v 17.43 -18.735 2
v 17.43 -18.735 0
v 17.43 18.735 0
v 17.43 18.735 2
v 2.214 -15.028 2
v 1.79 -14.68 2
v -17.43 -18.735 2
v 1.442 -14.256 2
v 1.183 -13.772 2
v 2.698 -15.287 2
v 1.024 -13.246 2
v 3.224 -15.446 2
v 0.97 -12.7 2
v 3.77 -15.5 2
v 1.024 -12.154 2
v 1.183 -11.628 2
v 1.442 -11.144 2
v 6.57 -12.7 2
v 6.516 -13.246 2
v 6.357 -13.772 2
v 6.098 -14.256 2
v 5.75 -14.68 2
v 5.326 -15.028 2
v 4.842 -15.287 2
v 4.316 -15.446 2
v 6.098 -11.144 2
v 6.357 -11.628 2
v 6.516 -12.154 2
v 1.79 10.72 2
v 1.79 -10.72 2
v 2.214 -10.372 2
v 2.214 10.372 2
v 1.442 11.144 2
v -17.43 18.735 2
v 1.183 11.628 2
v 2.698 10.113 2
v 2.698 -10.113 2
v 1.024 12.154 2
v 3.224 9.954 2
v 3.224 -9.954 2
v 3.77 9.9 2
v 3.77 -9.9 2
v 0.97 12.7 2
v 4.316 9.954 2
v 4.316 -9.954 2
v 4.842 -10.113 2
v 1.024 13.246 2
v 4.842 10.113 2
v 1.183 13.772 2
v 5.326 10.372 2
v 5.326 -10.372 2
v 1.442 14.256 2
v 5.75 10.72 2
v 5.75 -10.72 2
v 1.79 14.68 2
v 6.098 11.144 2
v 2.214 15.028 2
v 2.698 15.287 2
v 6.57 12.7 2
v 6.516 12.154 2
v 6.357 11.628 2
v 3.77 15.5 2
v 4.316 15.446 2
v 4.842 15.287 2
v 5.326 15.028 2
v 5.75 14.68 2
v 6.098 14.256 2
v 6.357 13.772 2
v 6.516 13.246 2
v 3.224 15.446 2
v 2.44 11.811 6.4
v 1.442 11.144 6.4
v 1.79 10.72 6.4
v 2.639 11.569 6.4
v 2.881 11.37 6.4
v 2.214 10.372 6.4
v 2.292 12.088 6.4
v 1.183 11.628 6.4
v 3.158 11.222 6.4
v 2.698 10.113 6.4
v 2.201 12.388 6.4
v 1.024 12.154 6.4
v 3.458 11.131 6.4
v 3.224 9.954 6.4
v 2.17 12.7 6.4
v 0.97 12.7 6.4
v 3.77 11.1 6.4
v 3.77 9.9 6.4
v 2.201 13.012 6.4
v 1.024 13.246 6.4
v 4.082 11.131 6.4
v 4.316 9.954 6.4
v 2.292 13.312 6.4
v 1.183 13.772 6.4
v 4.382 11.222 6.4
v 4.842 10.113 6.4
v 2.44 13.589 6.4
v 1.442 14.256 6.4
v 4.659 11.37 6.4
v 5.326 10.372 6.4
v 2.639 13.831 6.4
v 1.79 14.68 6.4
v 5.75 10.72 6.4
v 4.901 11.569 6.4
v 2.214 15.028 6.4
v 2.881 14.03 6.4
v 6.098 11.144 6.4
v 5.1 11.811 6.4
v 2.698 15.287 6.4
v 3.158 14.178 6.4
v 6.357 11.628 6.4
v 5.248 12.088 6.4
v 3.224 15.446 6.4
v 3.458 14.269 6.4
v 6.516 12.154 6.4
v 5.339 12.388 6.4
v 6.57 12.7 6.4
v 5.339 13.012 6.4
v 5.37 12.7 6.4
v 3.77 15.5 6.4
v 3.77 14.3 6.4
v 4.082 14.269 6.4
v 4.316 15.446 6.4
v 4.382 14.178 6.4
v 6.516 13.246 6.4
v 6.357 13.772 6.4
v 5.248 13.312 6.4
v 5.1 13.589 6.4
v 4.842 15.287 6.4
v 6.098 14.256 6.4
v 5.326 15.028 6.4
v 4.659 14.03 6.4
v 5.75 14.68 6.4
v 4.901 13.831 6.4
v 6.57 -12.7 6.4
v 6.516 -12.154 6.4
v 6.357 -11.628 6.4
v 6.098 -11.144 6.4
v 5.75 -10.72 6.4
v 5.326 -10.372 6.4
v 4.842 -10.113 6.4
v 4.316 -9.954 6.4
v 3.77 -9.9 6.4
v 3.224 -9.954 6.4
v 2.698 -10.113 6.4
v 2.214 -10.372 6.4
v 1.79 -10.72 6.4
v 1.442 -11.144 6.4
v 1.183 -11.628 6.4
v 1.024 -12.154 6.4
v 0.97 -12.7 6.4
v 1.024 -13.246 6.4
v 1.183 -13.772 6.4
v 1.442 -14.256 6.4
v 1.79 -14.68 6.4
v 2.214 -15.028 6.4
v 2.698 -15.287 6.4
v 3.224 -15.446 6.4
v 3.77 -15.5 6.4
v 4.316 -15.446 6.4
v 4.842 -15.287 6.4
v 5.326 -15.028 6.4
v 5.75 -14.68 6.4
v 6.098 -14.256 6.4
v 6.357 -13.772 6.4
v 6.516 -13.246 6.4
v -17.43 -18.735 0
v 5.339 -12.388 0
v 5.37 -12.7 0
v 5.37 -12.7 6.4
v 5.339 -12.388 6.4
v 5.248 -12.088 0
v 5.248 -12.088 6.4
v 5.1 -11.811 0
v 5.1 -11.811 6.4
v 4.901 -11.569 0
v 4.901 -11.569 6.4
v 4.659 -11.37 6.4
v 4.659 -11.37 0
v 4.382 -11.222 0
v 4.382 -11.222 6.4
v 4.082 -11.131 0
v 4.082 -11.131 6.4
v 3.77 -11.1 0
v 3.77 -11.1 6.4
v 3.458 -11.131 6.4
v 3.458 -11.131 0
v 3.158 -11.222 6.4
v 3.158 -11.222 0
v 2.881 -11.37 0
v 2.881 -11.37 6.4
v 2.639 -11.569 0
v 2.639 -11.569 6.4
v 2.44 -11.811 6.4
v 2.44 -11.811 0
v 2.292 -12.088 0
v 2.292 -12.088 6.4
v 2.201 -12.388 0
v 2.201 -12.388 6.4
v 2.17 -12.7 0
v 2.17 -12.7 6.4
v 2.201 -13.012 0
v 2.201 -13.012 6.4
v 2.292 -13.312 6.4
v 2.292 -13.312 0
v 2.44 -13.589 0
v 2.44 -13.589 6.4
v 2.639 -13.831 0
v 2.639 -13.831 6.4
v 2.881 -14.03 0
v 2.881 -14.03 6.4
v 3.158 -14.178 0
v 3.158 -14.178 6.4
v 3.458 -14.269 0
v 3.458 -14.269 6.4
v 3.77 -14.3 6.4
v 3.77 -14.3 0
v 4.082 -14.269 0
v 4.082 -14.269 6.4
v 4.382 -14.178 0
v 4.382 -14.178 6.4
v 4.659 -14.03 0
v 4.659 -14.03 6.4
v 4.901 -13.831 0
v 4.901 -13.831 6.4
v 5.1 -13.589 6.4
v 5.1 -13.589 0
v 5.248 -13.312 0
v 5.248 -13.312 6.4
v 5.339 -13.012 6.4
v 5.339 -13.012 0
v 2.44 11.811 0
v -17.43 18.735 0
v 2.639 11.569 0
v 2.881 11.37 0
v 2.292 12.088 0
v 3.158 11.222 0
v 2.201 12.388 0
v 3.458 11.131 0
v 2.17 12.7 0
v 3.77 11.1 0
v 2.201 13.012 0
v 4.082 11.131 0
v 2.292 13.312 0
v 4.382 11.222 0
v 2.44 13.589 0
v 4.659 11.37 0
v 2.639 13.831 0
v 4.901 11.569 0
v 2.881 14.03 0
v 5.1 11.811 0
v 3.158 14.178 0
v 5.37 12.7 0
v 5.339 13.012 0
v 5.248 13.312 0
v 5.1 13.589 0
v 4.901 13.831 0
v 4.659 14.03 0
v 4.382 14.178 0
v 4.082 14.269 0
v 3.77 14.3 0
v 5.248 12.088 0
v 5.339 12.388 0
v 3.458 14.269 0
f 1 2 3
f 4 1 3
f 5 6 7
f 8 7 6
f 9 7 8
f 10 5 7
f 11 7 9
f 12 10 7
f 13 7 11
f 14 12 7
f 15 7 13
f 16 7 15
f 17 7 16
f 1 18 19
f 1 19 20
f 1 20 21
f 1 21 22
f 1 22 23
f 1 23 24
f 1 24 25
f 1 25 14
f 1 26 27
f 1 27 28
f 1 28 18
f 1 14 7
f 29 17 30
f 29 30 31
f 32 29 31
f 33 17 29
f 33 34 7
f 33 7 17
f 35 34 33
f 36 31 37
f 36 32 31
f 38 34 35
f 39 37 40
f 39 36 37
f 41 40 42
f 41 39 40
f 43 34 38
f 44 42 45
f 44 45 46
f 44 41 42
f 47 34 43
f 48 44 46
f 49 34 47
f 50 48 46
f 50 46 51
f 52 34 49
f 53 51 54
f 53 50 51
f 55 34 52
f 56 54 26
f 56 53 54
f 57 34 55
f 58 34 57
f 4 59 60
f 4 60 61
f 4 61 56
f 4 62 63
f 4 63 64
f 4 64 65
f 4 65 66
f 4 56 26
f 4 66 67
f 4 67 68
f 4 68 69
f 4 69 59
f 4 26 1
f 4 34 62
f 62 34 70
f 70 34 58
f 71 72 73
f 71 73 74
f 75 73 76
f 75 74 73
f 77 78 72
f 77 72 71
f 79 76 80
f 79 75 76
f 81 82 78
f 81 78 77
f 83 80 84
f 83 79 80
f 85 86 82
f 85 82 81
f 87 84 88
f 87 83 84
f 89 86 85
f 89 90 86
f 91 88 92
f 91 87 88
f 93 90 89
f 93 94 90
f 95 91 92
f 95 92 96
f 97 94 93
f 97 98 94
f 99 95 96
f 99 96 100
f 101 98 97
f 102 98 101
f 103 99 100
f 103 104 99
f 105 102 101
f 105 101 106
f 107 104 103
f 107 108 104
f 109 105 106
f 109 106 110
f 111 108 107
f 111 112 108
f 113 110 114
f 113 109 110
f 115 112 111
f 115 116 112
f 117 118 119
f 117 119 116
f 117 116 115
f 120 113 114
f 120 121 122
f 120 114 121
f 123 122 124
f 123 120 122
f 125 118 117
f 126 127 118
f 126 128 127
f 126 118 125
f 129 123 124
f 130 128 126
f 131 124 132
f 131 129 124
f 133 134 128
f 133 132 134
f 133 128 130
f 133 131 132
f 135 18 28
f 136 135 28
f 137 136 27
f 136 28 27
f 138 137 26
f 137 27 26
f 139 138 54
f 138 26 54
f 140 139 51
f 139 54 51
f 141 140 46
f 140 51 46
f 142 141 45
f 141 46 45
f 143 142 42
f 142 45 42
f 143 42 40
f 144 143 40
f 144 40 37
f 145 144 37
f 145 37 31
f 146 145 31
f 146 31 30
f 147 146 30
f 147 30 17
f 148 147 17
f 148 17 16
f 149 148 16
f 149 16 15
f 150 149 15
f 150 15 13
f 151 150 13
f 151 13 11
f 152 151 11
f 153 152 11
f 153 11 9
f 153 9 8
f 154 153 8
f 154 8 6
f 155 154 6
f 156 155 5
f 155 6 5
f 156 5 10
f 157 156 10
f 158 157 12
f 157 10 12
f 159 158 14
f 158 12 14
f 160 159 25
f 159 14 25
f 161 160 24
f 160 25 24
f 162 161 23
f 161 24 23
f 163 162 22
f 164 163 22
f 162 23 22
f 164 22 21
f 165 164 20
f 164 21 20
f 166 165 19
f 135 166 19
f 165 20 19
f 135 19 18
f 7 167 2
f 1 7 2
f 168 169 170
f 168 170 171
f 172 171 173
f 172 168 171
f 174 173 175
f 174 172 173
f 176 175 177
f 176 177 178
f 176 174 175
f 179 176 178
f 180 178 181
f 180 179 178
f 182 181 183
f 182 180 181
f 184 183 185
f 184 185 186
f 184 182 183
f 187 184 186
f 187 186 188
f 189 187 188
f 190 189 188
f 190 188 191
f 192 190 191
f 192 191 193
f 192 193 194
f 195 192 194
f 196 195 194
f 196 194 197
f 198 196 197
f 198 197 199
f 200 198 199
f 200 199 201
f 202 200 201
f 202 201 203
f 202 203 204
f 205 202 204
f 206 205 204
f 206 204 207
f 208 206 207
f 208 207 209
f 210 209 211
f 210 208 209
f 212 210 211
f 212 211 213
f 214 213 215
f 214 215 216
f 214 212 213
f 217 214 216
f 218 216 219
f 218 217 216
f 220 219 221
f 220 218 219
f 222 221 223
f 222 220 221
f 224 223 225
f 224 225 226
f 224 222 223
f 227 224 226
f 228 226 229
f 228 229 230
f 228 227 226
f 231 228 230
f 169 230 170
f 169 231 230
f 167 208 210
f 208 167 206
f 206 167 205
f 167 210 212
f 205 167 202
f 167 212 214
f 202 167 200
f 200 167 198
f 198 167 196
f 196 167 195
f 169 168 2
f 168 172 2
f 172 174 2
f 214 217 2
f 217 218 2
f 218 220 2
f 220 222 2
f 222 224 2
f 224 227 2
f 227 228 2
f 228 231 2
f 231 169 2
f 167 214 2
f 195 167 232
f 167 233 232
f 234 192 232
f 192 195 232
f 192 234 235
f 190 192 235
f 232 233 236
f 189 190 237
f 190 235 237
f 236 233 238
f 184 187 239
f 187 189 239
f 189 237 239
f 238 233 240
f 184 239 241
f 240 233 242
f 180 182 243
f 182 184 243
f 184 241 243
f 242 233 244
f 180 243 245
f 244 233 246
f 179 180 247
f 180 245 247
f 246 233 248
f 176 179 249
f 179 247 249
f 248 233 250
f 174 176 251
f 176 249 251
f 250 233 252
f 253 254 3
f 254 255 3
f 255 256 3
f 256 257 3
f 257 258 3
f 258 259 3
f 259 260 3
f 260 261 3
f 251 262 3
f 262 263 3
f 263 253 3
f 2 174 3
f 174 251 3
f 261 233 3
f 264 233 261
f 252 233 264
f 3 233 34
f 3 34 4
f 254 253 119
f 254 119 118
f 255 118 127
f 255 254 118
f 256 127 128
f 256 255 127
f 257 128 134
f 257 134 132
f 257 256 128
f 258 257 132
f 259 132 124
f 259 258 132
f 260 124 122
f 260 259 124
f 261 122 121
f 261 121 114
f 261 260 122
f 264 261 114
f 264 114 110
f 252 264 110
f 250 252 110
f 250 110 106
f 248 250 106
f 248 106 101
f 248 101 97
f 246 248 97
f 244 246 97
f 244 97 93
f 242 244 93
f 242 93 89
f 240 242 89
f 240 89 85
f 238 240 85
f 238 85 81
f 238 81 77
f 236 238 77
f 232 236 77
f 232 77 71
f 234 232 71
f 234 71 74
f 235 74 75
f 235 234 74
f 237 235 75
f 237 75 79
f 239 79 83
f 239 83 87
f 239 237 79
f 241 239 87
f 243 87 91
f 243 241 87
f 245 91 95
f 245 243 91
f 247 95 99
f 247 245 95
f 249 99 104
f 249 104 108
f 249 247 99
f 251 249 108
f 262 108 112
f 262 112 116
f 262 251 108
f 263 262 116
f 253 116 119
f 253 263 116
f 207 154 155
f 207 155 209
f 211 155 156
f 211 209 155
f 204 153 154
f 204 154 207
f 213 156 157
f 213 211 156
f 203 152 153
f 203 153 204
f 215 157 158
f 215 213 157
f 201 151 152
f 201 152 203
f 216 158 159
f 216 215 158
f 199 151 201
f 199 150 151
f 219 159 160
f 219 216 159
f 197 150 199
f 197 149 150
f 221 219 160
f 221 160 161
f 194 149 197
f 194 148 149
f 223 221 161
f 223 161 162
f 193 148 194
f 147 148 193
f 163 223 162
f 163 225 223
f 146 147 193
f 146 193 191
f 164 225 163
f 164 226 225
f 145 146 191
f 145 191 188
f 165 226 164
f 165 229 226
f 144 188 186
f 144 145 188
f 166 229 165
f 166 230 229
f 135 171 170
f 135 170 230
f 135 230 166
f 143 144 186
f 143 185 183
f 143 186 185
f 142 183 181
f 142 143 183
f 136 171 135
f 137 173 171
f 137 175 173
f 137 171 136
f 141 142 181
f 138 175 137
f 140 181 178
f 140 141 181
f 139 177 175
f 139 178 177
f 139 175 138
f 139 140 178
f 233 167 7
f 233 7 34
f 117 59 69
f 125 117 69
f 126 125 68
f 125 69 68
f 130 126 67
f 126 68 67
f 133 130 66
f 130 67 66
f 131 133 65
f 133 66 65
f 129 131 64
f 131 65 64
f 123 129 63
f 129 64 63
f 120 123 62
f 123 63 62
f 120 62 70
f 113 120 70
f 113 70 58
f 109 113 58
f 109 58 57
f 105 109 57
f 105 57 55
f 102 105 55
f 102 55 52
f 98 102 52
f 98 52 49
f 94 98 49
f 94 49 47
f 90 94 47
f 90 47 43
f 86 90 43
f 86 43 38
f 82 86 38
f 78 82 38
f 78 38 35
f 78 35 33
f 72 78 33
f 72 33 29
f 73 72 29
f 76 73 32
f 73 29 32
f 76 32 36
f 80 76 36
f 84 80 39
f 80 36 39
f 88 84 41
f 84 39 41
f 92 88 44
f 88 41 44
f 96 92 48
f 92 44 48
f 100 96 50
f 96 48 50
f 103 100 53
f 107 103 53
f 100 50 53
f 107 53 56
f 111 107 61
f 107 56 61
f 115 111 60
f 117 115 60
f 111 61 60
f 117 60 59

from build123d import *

# Parameters (mm, degrees)
F0_W     = 34.86
F0_H     = 37.47
F0_R     = 2.8
F0_W_2   = 4.5
F0_H_2   = 6.7
F0_R_2   = 1.6
F1_DEPTH = 2
F2_DEPTH = 6.4


with BuildPart() as f1:
    # F0 (on Top) → F1 (new body)
    with BuildSketch(Plane.XY):
        Rectangle(F0_W, F0_H)
        Polygon((15.03, 16.335), (15.03, -16.335), (-15.03, -16.335), (-15.03, -14.065), (-15.03, 3.565), (-15.03, 16.335), align=None, mode=Mode.SUBTRACT)
        Polygon((-15.03, -16.335), (15.03, -16.335), (15.03, 16.335), (-15.03, 16.335), (-15.03, 3.565), (-8.03, 3.565), (-8.03, -5.735), (-10.53, -5.735), (-10.53, -14.065), (-14.03, -14.065), (-15.03, -14.065), align=None)
        with Locations((3.77, -12.7)):
            Circle(F0_R, mode=Mode.SUBTRACT)
        with Locations((11.22, -8.785)):
            Rectangle(F0_W_2, F0_H_2, mode=Mode.SUBTRACT)
        with Locations((11.22, 0.235)):
            Rectangle(F0_W_2, F0_H_2, mode=Mode.SUBTRACT)
        with Locations((11.22, 9.185)):
            Rectangle(F0_W_2, F0_H_2, mode=Mode.SUBTRACT)
        with Locations((3.77, 12.7)):
            Circle(F0_R, mode=Mode.SUBTRACT)
        Polygon((-15.03, 3.565), (-15.03, -14.065), (-14.03, -14.065), (-10.53, -14.065), (-10.53, -5.735), (-8.03, -5.735), (-8.03, 3.565), align=None)
        with Locations((3.77, 12.7)):
            Circle(F0_R)
        with Locations((3.77, 12.7)):
            Circle(F0_R_2, mode=Mode.SUBTRACT)
        with Locations((3.77, -12.7)):
            Circle(F0_R)
        with Locations((3.77, -12.7)):
            Circle(F0_R_2, mode=Mode.SUBTRACT)
        with Locations((11.22, 9.185)):
            Rectangle(F0_W_2, F0_H_2)
        with Locations((11.22, 0.235)):
            Rectangle(F0_W_2, F0_H_2)
        with Locations((11.22, -8.785)):
            Rectangle(F0_W_2, F0_H_2)
    extrude(amount=F1_DEPTH)

    # F0 (on Top) → F2 (join)
    with BuildSketch(Plane.XY):
        with Locations((3.77, 12.7)):
            Circle(F0_R)
        with Locations((3.77, 12.7)):
            Circle(F0_R_2, mode=Mode.SUBTRACT)
        with Locations((3.77, -12.7)):
            Circle(F0_R)
        with Locations((3.77, -12.7)):
            Circle(F0_R_2, mode=Mode.SUBTRACT)
    extrude(amount=F2_DEPTH)


solid = f1.part
